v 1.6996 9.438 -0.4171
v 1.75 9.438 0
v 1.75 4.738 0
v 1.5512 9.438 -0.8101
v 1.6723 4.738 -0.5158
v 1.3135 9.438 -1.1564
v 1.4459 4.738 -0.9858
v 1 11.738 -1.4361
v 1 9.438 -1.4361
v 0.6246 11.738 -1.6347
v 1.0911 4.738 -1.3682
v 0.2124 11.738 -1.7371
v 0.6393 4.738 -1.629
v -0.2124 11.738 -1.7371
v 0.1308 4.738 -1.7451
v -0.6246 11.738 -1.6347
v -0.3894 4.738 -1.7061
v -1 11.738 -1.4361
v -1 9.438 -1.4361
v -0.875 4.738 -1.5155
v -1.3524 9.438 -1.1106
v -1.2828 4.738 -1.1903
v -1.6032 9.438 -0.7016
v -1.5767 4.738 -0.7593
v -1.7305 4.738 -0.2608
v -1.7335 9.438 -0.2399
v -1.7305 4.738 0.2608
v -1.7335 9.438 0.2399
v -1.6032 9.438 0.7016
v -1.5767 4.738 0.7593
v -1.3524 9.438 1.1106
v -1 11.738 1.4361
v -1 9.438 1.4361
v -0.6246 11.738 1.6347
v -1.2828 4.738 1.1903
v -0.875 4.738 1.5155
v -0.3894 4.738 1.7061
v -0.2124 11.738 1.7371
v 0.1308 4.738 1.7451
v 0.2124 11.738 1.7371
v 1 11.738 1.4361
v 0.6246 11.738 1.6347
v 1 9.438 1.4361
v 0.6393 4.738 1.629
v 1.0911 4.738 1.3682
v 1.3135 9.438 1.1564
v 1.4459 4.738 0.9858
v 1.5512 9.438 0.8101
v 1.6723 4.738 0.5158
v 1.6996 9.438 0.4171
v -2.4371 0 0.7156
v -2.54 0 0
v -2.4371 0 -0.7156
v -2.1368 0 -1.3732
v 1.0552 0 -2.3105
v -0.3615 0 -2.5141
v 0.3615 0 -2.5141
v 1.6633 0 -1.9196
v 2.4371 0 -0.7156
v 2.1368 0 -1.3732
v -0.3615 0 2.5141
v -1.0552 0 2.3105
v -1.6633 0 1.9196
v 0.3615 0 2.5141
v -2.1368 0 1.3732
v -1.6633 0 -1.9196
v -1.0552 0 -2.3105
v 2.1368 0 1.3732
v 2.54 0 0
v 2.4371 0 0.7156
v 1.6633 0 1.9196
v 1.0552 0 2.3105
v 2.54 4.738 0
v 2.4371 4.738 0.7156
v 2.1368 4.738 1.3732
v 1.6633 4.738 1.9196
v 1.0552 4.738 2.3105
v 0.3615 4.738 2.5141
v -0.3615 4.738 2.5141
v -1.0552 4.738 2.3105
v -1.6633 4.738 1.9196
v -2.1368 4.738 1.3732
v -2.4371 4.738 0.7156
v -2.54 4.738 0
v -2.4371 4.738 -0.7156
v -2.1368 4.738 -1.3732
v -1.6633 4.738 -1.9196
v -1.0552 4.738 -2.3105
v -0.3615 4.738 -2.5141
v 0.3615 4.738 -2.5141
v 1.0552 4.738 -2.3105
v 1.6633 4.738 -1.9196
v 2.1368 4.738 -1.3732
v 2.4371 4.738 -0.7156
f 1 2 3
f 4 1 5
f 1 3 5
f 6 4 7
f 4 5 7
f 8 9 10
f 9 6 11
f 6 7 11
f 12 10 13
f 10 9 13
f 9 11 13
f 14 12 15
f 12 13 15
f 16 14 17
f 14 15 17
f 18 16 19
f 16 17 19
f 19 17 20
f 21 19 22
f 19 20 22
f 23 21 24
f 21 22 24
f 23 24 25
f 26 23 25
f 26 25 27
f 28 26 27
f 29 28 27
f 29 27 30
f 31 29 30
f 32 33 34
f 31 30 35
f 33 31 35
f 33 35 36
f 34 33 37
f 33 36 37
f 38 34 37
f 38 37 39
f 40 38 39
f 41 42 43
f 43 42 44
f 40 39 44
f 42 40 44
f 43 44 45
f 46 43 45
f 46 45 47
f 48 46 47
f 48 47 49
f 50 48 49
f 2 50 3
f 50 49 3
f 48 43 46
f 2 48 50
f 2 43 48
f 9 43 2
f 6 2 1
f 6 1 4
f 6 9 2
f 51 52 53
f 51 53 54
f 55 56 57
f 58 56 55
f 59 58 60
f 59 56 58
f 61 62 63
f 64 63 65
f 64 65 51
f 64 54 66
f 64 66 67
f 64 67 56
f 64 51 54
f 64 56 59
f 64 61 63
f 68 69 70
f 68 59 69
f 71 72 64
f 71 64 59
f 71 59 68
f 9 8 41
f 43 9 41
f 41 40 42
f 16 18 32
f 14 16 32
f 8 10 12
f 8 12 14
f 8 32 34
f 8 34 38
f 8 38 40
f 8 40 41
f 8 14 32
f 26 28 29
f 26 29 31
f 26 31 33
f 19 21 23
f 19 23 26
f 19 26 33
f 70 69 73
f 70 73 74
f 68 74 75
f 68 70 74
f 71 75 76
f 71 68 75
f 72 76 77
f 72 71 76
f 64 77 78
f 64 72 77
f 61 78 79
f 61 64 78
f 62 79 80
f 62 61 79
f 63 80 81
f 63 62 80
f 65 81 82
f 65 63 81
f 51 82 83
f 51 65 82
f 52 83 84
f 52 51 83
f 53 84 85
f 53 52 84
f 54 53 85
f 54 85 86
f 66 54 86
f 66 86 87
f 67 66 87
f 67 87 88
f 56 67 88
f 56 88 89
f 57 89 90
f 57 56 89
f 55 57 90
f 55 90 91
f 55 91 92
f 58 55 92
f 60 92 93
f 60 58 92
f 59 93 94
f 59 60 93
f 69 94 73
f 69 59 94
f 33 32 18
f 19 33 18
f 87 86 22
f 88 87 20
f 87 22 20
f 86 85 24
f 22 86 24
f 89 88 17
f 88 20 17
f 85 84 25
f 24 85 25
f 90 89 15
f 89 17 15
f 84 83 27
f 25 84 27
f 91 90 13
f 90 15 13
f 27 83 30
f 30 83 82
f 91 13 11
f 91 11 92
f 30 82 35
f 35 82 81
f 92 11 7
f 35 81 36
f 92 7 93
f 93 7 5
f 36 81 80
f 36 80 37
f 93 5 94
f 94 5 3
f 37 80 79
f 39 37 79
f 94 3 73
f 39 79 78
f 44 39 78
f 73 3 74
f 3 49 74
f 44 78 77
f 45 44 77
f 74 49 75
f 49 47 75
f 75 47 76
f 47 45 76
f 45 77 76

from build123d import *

# Parameters (mm, degrees)
SKETCH1_R           = 1.75
BOSS_EXTRUDE1_DEPTH = 11.738
CUT_EXTRUDE1_DEPTH  = 2.3
SKETCH3_R           = 2.54
BOSS_EXTRUDE2_DEPTH = 4.738


with BuildPart() as part:
    # Sketch1 → Boss-Extrude1 (new body)
    with BuildSketch(Plane(origin=(0, 0, 0), x_dir=(1, 0, 0), z_dir=(0, 1, 0))):
        Circle(SKETCH1_R)
    extrude(amount=BOSS_EXTRUDE1_DEPTH)

    # Sketch2 → Cut-Extrude1 (cut)
    with BuildSketch(Plane(origin=(0, 11.738, 0), x_dir=(1, 0, 0), z_dir=(0, 1, 0))):
        with BuildLine():
            Line((-1, -1.436140662), (-1, 1.436140662))
            ThreePointArc((-1, 1.436140662), (-1.75, 0), (-1, -1.436140662))
        make_face()
        with BuildLine():
            ThreePointArc((1.75, 0), (1.551209206, 0.810092587), (1, 1.436140662))
            Line((1, 1.436140662), (1, -1.436140662))
            ThreePointArc((1, -1.436140662), (1.551209206, -0.810092587), (1.75, 0))
        make_face()
    extrude(amount=-CUT_EXTRUDE1_DEPTH, mode=Mode.SUBTRACT)

    # Sketch3 → Boss-Extrude2 (add)
    with BuildSketch(Plane.XZ):
        Circle(SKETCH3_R)
    extrude(amount=-BOSS_EXTRUDE2_DEPTH)


solid = part.part
